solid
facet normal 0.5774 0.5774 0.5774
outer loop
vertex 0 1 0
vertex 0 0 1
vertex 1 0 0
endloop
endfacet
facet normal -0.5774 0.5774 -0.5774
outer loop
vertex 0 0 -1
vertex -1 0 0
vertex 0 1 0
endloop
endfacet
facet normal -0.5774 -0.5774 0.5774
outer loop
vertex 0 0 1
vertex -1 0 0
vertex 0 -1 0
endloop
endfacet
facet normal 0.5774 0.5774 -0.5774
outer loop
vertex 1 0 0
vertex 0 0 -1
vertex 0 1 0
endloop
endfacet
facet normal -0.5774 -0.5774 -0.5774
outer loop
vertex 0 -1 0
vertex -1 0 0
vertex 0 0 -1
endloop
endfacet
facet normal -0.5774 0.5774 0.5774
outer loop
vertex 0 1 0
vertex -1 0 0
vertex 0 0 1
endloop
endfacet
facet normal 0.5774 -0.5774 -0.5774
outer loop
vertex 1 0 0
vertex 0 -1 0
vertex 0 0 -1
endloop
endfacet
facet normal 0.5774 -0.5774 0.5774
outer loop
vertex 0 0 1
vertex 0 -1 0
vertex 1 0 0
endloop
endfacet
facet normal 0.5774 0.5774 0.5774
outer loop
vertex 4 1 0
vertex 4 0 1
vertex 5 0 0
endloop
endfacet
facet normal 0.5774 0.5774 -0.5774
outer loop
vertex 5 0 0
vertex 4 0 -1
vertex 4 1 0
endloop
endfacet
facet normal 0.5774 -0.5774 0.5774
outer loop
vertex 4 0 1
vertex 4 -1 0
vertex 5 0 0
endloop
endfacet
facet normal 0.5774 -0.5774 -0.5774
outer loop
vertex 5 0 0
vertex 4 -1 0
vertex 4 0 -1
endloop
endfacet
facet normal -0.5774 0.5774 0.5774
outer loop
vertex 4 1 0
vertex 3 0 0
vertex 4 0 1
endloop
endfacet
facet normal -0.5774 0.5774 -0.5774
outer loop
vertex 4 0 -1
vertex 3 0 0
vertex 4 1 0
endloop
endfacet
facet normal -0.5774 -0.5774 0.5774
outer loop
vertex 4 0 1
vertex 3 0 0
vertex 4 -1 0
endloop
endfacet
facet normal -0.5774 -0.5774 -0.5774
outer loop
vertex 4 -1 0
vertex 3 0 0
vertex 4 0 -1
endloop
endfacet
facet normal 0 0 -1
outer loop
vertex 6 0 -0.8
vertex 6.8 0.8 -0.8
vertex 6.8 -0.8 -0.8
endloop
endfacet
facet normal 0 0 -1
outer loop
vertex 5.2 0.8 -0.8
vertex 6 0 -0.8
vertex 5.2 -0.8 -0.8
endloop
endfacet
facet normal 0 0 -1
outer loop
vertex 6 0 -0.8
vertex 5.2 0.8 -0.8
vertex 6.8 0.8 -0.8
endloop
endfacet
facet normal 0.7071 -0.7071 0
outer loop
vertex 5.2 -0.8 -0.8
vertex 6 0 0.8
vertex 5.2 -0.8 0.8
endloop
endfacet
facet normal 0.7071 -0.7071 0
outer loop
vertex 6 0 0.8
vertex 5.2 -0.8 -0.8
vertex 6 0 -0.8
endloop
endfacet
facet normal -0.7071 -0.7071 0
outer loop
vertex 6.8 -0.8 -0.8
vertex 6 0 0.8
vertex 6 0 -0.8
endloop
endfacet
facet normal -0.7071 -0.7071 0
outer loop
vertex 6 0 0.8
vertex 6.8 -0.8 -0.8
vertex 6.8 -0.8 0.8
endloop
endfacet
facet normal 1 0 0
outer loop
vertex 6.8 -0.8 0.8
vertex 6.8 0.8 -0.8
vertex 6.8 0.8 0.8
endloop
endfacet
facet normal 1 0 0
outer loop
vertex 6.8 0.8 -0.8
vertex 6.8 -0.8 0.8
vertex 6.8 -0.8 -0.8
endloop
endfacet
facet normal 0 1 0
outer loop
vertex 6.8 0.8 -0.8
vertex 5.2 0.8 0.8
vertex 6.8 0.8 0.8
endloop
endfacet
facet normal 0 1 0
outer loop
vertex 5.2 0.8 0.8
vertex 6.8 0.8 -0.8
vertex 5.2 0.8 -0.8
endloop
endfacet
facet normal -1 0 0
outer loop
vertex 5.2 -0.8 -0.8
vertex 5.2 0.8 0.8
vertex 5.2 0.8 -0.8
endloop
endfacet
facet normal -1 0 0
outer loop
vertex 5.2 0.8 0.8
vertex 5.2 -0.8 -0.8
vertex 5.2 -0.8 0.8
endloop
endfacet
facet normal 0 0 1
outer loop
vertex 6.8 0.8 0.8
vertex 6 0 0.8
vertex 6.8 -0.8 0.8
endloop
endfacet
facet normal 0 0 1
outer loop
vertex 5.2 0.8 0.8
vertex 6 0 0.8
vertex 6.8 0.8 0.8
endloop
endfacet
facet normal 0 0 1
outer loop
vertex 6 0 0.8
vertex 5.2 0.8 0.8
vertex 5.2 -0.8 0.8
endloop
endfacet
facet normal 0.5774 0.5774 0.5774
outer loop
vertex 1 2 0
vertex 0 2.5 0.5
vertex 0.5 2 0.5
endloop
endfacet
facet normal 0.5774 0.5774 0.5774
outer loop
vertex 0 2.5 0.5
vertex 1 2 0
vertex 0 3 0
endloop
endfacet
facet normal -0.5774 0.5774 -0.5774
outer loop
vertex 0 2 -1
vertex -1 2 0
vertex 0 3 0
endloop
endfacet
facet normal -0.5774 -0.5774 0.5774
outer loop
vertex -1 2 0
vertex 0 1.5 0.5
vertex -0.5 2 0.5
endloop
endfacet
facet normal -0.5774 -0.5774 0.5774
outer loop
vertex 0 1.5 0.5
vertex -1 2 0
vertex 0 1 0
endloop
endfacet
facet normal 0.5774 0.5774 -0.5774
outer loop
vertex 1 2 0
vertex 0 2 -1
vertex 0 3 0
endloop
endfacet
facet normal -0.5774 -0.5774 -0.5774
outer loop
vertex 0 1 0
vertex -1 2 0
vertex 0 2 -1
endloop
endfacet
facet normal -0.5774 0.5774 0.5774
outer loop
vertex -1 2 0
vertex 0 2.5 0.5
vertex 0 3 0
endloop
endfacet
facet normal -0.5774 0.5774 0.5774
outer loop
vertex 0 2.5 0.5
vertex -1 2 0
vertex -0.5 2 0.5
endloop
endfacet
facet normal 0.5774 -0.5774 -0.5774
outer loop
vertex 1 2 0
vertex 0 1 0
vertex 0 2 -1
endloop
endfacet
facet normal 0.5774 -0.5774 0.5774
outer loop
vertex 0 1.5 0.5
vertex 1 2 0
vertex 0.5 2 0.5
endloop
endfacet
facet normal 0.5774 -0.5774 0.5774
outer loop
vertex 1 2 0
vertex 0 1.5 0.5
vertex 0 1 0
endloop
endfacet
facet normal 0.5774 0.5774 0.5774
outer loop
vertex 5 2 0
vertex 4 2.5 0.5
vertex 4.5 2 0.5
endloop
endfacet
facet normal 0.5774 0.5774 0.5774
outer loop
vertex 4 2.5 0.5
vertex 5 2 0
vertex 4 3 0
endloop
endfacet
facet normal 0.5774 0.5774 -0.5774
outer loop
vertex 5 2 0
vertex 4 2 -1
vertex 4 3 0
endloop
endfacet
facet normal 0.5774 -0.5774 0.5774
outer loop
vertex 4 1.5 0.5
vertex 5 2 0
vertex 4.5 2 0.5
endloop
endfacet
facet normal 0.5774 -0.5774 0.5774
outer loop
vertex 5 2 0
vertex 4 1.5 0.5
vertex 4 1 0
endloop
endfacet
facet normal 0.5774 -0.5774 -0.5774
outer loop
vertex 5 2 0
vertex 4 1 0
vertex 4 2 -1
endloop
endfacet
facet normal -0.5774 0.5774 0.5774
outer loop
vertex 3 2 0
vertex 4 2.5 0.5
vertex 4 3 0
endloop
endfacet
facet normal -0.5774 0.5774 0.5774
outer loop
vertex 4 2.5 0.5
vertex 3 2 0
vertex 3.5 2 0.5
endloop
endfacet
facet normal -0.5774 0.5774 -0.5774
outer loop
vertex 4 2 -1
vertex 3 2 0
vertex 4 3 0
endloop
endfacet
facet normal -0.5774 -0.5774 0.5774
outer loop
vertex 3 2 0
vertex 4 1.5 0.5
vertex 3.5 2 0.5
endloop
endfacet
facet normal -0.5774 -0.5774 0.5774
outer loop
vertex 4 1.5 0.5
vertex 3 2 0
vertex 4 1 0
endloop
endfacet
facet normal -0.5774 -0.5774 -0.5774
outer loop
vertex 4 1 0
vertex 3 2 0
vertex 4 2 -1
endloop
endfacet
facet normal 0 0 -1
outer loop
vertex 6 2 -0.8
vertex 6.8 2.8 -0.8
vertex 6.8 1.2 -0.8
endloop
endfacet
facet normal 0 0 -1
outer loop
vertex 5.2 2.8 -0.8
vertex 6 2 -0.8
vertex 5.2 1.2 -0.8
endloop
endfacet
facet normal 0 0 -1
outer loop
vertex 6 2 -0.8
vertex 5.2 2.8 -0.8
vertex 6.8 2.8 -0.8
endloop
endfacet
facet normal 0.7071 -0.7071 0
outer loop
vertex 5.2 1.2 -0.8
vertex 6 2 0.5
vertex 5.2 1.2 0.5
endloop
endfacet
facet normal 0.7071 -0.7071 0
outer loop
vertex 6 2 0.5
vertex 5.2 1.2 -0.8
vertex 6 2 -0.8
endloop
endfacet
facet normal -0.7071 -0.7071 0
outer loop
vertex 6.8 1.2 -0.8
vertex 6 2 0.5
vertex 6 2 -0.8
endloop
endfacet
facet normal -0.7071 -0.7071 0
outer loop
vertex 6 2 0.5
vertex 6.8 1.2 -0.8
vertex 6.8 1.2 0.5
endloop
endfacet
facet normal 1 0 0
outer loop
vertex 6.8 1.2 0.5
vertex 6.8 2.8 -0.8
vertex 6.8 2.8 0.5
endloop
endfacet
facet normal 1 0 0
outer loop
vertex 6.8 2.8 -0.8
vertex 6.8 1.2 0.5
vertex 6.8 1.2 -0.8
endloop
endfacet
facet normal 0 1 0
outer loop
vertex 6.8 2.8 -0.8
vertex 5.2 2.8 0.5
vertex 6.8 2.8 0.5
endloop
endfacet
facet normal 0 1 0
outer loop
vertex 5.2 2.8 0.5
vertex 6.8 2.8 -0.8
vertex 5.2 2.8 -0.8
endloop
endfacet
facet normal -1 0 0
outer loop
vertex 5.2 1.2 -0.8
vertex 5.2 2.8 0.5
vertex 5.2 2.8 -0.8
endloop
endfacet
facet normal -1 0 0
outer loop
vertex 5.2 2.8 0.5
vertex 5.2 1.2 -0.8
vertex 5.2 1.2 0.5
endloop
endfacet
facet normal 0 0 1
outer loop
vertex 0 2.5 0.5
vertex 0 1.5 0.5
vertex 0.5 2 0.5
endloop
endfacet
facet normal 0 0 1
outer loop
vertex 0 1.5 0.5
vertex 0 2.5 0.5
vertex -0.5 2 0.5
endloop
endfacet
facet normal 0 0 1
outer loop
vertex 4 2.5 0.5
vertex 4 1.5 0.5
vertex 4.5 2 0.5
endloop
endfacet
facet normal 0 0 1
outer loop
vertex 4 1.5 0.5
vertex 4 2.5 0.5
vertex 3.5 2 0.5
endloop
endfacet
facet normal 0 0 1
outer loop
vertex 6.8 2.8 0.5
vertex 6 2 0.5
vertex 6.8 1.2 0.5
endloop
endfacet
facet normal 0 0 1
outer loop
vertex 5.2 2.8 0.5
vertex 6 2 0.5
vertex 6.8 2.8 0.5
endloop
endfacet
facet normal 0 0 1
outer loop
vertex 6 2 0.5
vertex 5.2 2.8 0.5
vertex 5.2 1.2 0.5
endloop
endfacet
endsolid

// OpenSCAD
module polyhedrons() {
 polyhedron(points = [[1,0,0],[-1,0,0],[0,1,0],[0,-1,0],[0,0,1],[0,0,-1]],
            triangles = [[0,4,2],[0,2,5],[0,3,4],[0,5,3],[1,2,4],[1,5,2],[1,4,3], [1,3,5]]);

 // One face flipped
 translate([2,0,0])
  polyhedron(points = [[1,0,0],[-1,0,0],[0,1,0],[0,-1,0],[0,0,1],[0,0,-1]],
            triangles = [[0,4,2],[0,2,5],[0,3,4],[0,5,3],[1,2,4],[1,5,2],[1,3,4], [1,3,5]]);

 // All faces flipped
 translate([4,0,0])
  polyhedron(points = [[1,0,0],[-1,0,0],[0,1,0],[0,-1,0],[0,0,1],[0,0,-1]],
            triangles = [[0,2,4],[0,5,2],[0,4,3],[0,3,5],[1,4,2],[1,2,5],[1,3,4], [1,5,3]]);

// Containing concave polygons
translate([6,0,0])
polyhedron(points=[
        [-0.8,-0.8,-0.8],
        [0,0,-0.8],
        [0.8,-0.8,-0.8],
        [0.8,0.8,-0.8],
        [-0.8,0.8,-0.8],
        [-0.8,-0.8,0.8],
        [0,0,0.8],
        [0.8,-0.8,0.8],
        [0.8,0.8,0.8],
        [-0.8,0.8,0.8],
    ],
    triangles=[
        [0,1,2,3,4],
        [5,6,1,0],
        [6,7,2,1],
        [7,8,3,2],
        [8,9,4,3],
        [9,5,0,4],
        [9,8,7,6,5],
    ], convexity=2);
}

polyhedrons();
translate([0,2,0]) difference() {
  polyhedrons();
  translate([3,0,2]) cube([8,3,3], center=true);
}
